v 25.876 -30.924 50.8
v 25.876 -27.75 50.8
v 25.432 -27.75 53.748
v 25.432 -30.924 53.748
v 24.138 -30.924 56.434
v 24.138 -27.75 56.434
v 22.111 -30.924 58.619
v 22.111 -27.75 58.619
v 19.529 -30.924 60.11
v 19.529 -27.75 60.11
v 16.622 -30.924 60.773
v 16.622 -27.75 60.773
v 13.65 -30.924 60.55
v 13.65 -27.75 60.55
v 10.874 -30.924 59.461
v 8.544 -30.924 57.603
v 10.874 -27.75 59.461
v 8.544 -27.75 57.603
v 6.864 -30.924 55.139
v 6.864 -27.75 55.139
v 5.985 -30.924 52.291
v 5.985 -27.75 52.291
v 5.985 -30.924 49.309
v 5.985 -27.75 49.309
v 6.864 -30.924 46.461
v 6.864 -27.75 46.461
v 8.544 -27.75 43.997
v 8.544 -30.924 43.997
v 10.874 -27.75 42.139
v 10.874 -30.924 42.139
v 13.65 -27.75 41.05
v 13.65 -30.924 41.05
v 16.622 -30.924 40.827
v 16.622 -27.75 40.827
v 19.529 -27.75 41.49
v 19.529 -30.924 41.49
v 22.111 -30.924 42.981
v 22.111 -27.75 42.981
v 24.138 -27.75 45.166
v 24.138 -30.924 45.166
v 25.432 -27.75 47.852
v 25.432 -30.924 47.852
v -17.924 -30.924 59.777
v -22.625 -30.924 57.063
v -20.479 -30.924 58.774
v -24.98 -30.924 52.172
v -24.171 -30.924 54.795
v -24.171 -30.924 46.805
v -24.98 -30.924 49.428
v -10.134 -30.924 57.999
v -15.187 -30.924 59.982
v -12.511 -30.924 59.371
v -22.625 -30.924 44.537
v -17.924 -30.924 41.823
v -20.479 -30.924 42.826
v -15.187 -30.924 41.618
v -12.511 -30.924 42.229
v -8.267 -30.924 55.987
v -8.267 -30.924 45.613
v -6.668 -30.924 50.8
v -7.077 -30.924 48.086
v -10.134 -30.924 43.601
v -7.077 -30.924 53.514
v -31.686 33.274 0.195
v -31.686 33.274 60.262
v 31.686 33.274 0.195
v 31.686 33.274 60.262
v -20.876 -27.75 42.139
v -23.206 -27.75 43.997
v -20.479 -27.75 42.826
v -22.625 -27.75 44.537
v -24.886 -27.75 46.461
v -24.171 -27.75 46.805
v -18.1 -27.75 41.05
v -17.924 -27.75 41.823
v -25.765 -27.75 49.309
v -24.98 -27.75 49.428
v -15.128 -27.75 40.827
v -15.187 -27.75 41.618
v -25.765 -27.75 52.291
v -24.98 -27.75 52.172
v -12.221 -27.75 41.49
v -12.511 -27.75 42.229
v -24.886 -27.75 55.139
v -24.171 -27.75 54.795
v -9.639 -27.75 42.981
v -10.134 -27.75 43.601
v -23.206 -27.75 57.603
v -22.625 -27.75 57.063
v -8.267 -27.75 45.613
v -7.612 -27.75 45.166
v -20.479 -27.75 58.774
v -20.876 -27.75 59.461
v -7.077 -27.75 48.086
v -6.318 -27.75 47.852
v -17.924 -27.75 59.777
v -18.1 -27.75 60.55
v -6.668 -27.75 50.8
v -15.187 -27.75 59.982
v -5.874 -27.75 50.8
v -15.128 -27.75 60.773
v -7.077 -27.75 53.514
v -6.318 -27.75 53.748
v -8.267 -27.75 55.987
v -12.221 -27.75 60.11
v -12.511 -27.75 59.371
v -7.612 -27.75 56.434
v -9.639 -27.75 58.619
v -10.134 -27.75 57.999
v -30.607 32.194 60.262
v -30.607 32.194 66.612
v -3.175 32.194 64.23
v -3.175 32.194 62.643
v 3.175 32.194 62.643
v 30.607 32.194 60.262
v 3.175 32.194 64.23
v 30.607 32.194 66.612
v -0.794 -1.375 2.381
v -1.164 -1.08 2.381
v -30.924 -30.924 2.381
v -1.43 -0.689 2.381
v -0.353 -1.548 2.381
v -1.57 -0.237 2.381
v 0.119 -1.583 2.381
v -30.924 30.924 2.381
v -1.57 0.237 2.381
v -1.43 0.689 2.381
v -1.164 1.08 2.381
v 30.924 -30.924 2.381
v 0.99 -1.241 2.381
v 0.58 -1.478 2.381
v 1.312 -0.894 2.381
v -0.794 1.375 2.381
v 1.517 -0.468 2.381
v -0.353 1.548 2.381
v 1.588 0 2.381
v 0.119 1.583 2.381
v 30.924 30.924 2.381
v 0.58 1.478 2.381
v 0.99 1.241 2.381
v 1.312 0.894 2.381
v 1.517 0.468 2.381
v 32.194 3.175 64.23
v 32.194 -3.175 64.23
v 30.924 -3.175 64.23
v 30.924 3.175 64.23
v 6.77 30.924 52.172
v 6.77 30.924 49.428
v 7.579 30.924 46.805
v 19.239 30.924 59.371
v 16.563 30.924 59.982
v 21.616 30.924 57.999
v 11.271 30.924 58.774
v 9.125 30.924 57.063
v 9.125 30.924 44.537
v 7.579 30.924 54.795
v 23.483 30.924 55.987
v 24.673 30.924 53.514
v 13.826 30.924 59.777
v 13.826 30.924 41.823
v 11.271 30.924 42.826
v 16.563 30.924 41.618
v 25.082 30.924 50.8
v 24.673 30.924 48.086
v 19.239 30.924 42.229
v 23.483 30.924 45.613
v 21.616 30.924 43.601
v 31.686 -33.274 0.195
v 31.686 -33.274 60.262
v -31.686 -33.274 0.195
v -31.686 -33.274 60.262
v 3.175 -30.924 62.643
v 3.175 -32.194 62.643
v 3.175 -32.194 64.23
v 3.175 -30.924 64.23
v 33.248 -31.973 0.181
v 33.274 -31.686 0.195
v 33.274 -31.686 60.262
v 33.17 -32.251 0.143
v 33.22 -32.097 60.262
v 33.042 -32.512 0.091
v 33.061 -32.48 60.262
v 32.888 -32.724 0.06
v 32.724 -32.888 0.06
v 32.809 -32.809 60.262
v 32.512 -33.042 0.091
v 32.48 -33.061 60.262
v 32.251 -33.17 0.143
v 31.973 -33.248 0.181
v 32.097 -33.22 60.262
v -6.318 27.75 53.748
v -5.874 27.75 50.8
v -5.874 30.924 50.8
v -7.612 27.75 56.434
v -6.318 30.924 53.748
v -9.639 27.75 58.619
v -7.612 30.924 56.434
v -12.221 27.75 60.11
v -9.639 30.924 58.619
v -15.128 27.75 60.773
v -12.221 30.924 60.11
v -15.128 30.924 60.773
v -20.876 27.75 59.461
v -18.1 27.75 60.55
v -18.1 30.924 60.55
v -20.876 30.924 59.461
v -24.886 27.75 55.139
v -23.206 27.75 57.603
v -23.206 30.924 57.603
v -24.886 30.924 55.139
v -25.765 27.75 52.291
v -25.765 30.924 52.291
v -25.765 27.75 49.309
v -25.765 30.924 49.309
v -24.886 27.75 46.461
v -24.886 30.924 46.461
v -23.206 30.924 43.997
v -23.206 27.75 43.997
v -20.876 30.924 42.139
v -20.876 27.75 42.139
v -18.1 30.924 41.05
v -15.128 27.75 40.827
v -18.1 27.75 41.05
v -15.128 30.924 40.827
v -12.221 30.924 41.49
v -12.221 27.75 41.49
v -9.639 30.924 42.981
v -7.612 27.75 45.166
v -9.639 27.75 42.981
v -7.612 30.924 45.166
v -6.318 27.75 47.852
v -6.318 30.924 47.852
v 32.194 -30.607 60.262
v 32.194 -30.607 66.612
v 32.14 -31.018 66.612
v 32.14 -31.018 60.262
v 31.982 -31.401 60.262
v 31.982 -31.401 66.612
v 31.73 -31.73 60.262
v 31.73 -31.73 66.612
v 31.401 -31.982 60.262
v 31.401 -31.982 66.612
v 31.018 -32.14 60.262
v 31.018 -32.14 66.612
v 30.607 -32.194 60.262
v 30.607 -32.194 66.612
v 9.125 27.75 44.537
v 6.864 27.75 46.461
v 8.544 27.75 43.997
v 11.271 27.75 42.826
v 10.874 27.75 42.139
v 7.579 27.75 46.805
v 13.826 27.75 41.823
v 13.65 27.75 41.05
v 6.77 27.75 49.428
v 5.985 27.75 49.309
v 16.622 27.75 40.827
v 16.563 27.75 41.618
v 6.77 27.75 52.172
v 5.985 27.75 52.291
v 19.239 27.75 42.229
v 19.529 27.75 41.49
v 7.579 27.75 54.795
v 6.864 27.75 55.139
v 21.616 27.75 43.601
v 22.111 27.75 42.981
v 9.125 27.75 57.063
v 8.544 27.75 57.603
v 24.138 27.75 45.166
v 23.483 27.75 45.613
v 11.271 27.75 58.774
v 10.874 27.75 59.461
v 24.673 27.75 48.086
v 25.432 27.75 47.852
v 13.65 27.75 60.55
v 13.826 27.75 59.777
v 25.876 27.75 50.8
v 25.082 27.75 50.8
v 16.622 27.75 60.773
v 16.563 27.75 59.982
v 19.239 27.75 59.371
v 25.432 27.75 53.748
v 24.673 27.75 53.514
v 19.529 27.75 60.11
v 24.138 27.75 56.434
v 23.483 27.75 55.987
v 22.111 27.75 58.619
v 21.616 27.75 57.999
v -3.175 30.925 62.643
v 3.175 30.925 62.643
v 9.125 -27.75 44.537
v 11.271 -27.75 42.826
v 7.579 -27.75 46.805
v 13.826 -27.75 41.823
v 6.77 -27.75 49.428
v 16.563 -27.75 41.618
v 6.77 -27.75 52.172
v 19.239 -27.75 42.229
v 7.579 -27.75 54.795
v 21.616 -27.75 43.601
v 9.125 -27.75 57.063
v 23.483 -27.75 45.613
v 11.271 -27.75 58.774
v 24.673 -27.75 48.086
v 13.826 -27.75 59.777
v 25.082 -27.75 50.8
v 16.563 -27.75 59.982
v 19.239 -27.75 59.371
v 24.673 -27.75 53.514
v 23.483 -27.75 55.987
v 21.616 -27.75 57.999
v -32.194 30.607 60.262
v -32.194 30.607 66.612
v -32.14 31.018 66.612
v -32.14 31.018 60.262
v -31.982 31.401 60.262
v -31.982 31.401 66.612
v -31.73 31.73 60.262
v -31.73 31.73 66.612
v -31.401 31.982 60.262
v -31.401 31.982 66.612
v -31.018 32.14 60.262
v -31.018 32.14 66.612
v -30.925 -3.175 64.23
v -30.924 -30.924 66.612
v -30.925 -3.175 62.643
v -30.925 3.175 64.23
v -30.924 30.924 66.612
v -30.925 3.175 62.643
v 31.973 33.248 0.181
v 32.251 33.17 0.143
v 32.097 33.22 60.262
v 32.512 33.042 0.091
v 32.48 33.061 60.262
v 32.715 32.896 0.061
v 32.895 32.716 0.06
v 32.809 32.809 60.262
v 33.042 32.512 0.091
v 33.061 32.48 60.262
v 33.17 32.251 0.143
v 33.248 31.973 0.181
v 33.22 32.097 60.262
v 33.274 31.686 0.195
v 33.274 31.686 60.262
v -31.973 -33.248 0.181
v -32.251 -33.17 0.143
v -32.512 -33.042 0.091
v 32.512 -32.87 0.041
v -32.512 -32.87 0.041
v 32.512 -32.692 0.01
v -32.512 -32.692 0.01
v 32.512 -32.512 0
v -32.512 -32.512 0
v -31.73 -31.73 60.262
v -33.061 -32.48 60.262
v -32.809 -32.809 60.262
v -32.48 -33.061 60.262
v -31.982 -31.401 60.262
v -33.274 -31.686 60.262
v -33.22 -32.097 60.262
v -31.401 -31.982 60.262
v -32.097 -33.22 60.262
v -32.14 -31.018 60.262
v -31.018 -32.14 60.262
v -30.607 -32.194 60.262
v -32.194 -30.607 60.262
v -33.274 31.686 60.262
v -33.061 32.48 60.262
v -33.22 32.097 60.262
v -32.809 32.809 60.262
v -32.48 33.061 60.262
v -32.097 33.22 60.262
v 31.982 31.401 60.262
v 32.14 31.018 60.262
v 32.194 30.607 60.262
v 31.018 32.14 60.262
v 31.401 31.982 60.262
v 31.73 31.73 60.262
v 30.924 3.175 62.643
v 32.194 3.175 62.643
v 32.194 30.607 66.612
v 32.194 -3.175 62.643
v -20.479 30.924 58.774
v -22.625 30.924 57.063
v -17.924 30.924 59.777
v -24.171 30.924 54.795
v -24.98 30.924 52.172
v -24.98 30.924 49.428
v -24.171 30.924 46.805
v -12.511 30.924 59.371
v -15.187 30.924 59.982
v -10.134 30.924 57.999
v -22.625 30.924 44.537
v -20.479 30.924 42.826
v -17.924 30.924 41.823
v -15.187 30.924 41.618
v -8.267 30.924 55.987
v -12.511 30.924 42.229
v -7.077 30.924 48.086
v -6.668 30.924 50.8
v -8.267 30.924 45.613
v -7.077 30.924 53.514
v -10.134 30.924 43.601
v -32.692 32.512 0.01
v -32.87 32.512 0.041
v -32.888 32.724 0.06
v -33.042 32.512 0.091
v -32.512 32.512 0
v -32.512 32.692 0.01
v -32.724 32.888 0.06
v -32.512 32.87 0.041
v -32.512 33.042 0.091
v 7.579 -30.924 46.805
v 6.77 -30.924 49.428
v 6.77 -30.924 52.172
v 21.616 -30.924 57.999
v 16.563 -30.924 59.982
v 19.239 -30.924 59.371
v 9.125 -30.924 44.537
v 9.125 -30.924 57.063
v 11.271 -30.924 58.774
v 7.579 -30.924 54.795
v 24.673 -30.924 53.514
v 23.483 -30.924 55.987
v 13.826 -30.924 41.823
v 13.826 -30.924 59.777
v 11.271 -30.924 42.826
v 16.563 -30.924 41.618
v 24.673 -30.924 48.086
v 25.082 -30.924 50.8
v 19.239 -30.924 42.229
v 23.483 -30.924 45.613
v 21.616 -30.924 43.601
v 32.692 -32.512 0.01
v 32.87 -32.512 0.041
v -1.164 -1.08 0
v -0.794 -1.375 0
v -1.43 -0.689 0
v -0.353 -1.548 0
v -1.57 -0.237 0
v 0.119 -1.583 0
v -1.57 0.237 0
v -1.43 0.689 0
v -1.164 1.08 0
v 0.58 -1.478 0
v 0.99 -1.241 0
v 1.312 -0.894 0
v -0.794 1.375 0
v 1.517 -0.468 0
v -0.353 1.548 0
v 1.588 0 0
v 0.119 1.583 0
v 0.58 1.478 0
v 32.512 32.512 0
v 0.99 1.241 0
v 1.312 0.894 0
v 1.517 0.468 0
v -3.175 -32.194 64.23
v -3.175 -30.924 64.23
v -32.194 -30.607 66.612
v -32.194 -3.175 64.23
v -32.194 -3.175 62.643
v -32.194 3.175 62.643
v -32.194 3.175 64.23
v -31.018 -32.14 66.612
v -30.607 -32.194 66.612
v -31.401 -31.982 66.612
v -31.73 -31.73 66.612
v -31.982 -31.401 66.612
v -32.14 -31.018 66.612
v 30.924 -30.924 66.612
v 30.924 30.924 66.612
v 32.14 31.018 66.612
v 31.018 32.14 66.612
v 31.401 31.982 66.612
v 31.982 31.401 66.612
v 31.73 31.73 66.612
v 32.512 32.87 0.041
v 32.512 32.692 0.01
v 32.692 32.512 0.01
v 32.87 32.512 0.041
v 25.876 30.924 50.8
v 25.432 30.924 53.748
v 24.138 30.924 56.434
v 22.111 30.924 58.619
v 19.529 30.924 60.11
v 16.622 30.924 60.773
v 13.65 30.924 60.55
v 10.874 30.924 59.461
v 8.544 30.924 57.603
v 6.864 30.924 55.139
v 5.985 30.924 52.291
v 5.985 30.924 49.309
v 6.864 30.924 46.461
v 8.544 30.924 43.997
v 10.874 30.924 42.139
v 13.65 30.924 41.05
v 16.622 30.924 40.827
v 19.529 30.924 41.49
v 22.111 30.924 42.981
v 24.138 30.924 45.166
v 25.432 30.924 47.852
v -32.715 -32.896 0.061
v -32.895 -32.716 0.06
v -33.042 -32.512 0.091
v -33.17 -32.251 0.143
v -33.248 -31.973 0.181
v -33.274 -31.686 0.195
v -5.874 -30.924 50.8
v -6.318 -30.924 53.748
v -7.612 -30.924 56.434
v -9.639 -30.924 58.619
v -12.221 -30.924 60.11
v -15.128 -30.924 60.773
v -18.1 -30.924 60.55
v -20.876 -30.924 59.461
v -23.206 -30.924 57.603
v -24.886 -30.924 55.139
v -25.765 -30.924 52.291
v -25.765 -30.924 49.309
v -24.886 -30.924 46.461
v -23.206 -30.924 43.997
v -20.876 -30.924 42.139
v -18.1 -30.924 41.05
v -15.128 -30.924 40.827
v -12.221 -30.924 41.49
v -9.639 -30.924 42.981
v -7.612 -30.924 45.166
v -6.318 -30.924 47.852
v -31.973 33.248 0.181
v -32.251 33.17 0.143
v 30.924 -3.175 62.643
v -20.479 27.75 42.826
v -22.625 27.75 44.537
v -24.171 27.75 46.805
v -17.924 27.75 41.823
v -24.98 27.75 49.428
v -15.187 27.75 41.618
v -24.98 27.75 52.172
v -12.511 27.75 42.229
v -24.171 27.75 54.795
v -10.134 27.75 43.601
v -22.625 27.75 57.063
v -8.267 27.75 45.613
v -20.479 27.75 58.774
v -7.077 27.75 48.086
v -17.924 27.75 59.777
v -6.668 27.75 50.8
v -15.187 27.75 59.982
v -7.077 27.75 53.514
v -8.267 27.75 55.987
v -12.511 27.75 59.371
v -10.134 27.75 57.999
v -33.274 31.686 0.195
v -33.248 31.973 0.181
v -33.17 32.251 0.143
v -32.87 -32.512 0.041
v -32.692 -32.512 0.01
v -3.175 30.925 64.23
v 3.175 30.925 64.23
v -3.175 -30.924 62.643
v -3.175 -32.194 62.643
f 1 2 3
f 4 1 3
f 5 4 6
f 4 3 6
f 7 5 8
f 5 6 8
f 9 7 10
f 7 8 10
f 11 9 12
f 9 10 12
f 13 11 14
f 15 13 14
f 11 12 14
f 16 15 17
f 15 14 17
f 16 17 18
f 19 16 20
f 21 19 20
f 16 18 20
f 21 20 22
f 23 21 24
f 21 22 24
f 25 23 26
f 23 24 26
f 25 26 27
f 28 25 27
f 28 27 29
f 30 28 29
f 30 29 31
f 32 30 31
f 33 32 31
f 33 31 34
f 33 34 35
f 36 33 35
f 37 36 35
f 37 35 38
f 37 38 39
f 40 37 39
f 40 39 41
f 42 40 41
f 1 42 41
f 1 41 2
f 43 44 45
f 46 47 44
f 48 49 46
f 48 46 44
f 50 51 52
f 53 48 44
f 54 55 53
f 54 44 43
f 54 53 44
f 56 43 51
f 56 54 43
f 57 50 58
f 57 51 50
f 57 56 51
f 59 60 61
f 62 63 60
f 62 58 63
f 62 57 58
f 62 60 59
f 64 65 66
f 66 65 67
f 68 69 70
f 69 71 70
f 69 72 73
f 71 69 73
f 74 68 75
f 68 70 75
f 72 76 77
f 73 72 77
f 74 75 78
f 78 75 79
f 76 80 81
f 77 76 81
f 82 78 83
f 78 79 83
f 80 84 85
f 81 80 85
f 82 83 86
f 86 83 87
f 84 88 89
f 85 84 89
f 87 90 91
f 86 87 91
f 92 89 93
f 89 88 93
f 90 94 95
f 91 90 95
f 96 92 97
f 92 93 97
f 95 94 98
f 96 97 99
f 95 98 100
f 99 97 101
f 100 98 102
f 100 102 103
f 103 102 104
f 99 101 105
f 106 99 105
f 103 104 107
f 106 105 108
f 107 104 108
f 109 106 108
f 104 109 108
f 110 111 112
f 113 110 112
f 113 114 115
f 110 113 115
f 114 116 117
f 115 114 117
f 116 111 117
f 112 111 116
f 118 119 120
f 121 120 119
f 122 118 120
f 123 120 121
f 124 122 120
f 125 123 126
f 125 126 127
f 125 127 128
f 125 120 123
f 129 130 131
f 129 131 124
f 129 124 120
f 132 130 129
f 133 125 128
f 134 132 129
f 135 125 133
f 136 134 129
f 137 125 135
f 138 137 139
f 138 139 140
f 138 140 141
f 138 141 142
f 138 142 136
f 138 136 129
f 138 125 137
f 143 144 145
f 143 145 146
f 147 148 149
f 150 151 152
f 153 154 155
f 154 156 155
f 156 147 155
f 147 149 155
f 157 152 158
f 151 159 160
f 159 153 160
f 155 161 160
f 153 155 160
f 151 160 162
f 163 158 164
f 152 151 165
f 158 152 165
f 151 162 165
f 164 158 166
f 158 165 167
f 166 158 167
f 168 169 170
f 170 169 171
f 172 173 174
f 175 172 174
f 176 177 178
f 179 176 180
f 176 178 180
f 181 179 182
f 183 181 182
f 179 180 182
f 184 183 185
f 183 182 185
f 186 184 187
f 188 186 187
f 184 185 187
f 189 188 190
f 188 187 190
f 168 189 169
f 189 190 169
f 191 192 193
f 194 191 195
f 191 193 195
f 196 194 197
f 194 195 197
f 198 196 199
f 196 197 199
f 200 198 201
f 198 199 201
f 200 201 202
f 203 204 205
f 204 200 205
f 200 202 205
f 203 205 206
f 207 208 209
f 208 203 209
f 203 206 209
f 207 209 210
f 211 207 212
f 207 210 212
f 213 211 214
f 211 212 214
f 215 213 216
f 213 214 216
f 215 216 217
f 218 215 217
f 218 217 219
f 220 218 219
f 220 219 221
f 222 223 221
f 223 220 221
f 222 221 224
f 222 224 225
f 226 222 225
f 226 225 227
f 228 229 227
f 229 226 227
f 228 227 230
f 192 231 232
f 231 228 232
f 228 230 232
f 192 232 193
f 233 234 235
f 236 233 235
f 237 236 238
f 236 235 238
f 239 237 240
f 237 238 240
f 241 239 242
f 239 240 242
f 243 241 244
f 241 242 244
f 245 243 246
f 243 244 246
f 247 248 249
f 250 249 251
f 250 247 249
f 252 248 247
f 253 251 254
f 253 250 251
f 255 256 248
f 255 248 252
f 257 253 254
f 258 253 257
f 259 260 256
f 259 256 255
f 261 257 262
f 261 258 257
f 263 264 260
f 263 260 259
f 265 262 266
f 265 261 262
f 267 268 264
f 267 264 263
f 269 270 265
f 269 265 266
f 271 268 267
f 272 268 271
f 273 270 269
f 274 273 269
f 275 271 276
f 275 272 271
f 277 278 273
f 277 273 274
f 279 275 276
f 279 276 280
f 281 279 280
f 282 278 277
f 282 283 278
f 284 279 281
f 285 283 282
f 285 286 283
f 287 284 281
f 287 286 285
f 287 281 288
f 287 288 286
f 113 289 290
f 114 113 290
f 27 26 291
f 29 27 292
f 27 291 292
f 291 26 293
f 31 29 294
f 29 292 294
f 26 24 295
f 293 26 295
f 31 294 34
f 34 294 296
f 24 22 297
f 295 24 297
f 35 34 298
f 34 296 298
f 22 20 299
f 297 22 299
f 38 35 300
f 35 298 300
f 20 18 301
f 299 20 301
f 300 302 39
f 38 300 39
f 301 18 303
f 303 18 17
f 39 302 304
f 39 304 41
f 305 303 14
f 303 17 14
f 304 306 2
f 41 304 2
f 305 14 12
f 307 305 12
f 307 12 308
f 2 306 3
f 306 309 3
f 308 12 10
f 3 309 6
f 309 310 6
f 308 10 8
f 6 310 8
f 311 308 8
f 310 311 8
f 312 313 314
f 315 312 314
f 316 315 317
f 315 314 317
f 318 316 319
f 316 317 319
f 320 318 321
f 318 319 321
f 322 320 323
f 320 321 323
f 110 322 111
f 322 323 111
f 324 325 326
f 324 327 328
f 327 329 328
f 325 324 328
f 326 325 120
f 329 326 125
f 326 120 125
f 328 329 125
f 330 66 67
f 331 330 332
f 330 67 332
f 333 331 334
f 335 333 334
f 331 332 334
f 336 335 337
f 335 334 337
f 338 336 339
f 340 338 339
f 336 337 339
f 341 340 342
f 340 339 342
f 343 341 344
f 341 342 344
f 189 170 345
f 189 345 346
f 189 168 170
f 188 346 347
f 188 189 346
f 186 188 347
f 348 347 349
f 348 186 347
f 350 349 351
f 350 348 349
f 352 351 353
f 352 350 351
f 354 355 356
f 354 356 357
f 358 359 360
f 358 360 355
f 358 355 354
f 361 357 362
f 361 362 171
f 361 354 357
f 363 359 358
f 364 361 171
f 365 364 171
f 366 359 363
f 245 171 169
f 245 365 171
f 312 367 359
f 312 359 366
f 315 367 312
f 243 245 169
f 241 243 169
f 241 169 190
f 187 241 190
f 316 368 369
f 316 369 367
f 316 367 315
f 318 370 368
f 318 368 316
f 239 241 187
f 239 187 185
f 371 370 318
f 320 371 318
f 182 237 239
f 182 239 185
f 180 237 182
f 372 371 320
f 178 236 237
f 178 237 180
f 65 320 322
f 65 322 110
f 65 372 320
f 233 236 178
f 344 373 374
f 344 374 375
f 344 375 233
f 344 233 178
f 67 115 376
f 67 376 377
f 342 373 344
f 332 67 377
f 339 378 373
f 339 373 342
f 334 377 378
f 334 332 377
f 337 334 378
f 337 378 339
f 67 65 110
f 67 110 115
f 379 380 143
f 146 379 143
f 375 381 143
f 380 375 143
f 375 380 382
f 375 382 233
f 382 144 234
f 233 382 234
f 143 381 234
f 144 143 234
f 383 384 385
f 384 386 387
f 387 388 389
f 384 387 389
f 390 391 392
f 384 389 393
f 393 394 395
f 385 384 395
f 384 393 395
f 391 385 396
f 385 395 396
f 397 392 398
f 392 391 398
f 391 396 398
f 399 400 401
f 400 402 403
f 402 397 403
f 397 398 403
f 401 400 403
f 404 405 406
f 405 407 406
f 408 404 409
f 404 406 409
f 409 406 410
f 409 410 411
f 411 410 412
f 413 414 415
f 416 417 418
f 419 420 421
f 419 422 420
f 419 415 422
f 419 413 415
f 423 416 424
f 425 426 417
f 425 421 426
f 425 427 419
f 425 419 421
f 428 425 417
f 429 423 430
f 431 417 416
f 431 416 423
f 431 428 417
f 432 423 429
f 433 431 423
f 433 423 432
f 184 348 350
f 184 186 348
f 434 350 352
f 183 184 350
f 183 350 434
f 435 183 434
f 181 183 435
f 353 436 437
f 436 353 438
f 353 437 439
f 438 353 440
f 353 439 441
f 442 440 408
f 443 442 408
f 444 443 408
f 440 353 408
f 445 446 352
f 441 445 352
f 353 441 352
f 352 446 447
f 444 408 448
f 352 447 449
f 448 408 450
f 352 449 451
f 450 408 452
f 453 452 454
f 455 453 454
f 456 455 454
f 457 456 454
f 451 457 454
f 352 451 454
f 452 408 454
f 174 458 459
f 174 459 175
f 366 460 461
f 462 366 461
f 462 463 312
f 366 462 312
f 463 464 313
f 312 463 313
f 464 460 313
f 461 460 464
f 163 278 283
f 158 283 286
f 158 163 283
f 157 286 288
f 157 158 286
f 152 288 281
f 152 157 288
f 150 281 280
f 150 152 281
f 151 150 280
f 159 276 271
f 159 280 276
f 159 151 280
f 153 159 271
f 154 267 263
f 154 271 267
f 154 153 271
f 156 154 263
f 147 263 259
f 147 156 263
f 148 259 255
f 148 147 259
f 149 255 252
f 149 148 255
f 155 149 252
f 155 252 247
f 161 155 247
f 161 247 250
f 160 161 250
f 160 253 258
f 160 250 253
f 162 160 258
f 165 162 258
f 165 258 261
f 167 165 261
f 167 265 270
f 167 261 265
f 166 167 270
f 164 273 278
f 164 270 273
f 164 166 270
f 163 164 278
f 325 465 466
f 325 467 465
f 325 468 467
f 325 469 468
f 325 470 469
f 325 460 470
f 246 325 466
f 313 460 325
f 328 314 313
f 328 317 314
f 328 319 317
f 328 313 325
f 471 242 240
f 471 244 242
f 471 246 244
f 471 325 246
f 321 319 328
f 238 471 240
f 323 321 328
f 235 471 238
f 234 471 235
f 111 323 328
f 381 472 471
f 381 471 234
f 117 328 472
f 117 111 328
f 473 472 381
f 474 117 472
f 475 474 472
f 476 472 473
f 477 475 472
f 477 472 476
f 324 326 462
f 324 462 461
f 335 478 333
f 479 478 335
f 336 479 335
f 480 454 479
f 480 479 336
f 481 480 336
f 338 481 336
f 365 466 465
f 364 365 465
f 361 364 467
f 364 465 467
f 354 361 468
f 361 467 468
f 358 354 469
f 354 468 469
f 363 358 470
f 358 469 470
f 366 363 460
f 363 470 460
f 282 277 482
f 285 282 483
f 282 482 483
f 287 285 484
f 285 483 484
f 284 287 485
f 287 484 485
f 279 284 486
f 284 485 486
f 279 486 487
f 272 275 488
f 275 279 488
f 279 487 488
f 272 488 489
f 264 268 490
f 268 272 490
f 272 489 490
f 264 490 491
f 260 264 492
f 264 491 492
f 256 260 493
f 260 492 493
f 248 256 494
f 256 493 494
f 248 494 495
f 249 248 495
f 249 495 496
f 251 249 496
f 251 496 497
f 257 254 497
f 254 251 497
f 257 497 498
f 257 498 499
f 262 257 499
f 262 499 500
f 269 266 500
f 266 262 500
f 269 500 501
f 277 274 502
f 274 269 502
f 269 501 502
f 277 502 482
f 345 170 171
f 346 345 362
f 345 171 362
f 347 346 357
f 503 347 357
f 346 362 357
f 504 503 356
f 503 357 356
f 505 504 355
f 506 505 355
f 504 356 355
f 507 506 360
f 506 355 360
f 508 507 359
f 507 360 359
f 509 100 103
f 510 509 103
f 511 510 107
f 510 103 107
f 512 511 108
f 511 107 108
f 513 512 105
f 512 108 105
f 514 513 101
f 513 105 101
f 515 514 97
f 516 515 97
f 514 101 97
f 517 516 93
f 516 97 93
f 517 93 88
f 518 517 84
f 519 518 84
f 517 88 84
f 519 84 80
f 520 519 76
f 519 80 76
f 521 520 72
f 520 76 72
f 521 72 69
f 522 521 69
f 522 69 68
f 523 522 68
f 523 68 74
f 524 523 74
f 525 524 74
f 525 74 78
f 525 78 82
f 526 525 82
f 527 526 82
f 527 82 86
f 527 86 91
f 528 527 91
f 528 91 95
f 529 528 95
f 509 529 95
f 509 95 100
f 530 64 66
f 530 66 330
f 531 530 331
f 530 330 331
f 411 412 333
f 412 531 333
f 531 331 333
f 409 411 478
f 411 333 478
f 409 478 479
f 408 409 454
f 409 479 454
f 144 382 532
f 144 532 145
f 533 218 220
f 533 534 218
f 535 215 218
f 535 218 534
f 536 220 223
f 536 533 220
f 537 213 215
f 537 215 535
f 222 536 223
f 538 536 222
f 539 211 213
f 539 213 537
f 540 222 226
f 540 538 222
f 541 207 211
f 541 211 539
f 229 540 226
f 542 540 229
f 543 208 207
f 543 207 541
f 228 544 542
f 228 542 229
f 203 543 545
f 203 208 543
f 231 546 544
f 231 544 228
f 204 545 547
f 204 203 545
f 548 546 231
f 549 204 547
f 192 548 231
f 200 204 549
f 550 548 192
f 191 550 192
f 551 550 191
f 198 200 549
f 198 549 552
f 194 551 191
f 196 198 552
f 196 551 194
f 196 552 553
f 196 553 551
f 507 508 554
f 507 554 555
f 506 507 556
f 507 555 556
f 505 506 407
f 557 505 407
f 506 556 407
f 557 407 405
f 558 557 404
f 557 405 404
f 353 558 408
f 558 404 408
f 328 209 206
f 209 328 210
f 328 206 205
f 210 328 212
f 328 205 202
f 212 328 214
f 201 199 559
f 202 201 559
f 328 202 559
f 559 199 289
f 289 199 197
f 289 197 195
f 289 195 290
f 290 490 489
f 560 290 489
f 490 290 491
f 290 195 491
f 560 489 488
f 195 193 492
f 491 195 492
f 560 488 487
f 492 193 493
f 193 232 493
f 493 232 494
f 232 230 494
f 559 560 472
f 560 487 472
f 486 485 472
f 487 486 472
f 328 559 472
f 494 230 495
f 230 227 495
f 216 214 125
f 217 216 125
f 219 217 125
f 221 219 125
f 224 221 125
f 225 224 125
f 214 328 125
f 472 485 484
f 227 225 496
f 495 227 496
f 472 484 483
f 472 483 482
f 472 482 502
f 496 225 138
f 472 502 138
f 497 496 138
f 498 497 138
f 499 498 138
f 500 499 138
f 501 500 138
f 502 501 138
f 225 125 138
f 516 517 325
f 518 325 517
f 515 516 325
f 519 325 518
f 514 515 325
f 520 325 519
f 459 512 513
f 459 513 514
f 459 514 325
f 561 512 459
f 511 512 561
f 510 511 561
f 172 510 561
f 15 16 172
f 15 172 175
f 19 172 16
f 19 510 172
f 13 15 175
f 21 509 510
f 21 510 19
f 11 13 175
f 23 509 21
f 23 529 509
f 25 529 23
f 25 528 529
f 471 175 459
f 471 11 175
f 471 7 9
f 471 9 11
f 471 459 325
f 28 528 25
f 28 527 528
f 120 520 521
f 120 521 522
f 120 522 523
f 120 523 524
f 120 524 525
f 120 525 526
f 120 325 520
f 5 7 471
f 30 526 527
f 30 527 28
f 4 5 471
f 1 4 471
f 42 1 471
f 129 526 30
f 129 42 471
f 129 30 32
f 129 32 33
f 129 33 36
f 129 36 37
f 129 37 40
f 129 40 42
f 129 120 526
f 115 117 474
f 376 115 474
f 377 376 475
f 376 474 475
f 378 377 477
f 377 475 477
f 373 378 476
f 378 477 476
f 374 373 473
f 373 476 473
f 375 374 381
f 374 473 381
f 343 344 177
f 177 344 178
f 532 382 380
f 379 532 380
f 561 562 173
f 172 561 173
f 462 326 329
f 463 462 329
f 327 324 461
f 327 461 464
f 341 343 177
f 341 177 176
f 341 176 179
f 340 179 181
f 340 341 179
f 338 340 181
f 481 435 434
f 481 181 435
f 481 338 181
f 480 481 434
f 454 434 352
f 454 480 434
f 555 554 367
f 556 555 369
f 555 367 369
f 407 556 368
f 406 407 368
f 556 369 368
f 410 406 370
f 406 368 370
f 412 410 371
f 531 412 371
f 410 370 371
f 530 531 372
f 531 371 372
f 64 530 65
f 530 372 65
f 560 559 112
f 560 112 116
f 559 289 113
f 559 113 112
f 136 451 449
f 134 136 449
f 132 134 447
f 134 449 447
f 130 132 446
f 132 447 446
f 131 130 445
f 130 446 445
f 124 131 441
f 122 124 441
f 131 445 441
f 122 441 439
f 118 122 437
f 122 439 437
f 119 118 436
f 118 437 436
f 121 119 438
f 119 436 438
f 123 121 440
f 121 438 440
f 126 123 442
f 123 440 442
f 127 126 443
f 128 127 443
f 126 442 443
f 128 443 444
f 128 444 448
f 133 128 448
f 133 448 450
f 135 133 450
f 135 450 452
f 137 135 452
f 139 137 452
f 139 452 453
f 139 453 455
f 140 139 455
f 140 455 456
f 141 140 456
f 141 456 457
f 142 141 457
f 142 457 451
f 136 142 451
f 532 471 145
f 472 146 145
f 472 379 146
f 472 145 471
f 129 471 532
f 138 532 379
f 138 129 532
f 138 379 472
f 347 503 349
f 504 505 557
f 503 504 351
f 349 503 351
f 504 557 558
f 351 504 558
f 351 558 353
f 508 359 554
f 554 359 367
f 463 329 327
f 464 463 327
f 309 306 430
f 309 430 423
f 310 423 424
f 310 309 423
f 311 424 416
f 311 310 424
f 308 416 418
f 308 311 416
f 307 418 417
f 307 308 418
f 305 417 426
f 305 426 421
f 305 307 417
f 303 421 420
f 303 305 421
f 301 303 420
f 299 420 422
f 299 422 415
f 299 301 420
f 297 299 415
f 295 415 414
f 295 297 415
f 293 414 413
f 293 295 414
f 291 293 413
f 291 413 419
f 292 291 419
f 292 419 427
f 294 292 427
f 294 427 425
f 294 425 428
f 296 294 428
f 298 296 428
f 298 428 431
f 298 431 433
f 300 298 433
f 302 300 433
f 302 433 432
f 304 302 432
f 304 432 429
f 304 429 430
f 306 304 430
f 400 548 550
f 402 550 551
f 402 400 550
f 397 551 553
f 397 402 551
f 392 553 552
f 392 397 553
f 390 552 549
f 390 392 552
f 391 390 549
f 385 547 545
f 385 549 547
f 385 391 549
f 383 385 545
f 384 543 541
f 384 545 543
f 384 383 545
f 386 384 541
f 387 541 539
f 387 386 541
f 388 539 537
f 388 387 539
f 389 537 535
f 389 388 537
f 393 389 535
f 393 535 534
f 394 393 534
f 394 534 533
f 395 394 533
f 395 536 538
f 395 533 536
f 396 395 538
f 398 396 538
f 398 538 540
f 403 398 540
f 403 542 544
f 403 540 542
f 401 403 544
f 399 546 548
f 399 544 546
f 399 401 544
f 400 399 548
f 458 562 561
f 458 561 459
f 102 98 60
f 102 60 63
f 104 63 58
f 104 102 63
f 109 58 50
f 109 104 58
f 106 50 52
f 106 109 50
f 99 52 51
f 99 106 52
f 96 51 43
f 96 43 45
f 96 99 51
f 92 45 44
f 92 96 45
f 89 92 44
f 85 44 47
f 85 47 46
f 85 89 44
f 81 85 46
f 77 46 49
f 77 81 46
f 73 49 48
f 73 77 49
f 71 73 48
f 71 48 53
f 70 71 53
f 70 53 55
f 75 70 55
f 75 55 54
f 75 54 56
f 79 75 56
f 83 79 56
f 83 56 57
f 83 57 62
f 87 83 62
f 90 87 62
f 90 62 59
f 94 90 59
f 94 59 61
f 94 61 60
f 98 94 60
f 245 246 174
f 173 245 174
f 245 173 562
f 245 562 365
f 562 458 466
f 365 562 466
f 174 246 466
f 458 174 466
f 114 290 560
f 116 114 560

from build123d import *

# Parameters (mm, degrees)
F0_W      = 68.199
F0_H      = 68.199
F1_DEPTH  = 66.6115
F2_R      = 1.5875
F3_T      = -3.175
F4_W      = 3.175
F4_H      = 3.175
F4_W_2    = 6.35
F4_H_2    = 6.35
F5_DEPTH  = 25.4
F6_R      = 1.5875
F7_DEPTH  = 6.35
F8_W      = 74.20966
F8_H      = 75.78341
F9_DEPTH  = 6.35
F10_W     = 6.35
F10_H     = 1.5875
F11_DEPTH = 66.295
F12_W     = 6.35
F12_H     = 1.5875
F13_DEPTH = 66.295
F14_R     = 10.00125
F14_R_2   = 9.2075
F15_DEPTH = 61.849
F16_W     = 55.499
F16_H     = 55.499
F17_DEPTH = 38.1
F18_W     = 61.849
F18_H     = 61.849
F19_DEPTH = 0.79375
F20_W     = 68.199
F20_H     = 68.199
F21_DEPTH = 66.6125


with BuildPart() as f1:
    # F0 (on Top) → F1 (new body)
    with BuildSketch(Plane.XY):
        Rectangle(F0_W, F0_H)
    extrude(amount=F1_DEPTH)

    # F2
    f2_edges = [f1.edges().sort_by_distance(p)[0] for p in [
        (-34.0995, 34.0995, 33.30575),
        (-34.0995, 0, 0),
        (-34.0995, -34.0995, 33.30575),
        (34.0995, -34.0995, 33.30575),
        (0, -34.0995, 0),
        (34.0995, 0, 0),
        (0, 34.0995, 0),
        (34.0995, 34.0995, 33.30575),
    ]]
    fillet(f2_edges, radius=F2_R)

    # F3
    f3_openings = [f1.faces().sort_by_distance(p)[0] for p in [
        (0, 0, 66.6115),
    ]]
    offset(amount=F3_T, openings=f3_openings)

    # F4 (on face) → F5 (cut)
    with BuildSketch(Plane.XY.offset(3.175)):
        with Locations((-29.337, 29.337)):
            Rectangle(F4_W, F4_H)
        with Locations((29.337, 29.337)):
            Rectangle(F4_W, F4_H)
        with Locations((-29.337, -29.337)):
            Rectangle(F4_W, F4_H)
        with Locations((29.337, -29.337)):
            Rectangle(F4_W, F4_H)
        with Locations((0, 29.337)):
            Rectangle(F4_W_2, F4_H)
        with Locations((-29.337, 0)):
            Rectangle(F4_W, F4_H_2)
        with Locations((29.337, 0)):
            Rectangle(F4_W, F4_H_2)
        with Locations((0, -29.337)):
            Rectangle(F4_W_2, F4_H)
    extrude(amount=F5_DEPTH, mode=Mode.SUBTRACT)

    # F6 (on face) → F7 (cut)
    with BuildSketch(Plane(origin=(0, 0, 0), x_dir=(1, 0, 0), z_dir=(0, 0, -1))):
        Circle(F6_R)
    extrude(amount=-F7_DEPTH, mode=Mode.SUBTRACT)

    # F8 (on face) → F9 (cut)
    with BuildSketch(Plane.XY.offset(66.6115)):
        Rectangle(F8_W, F8_H)
        with BuildLine():
            Line((-30.607, 32.1945), (30.607, 32.1945))
            ThreePointArc((30.607, 32.1945), (31.729532, 31.729532), (32.1945, 30.607))
            Line((32.1945, 30.607), (32.1945, -30.607))
            ThreePointArc((32.1945, -30.607), (31.729532, -31.729532), (30.607, -32.1945))
            Line((30.607, -32.1945), (-30.607, -32.1945))
            ThreePointArc((-30.607, -32.1945), (-31.729532, -31.729532), (-32.1945, -30.607))
            Line((-32.1945, -30.607), (-32.1945, 30.607))
            ThreePointArc((-32.1945, 30.607), (-31.729532, 31.729532), (-30.607, 32.1945))
        make_face(mode=Mode.SUBTRACT)
    extrude(amount=-F9_DEPTH, mode=Mode.SUBTRACT)

    # F10 (on face) → F11 (cut, through all)
    with BuildSketch(Plane.XZ.offset(32.1945)):
        with Locations((0, 63.4365)):
            Rectangle(F10_W, F10_H)
    extrude(amount=-F11_DEPTH, mode=Mode.SUBTRACT)

    # F12 (on face) → F13 (cut, through all)
    with BuildSketch(Plane.YZ.offset(32.1945)):
        with Locations((0, 63.4365)):
            Rectangle(F12_W, F12_H)
    extrude(amount=-F13_DEPTH, mode=Mode.SUBTRACT)

    # F14 (on face) → F15 (join, through all)
    with BuildSketch(Plane.XZ.offset(-30.9245)):
        with Locations((-15.875, 50.8)):
            Circle(F14_R)
        with Locations((-15.875, 50.8)):
            Circle(F14_R_2, mode=Mode.SUBTRACT)
        with Locations((15.875, 50.8)):
            Circle(F14_R)
        with Locations((15.875, 50.8)):
            Circle(F14_R_2, mode=Mode.SUBTRACT)
    extrude(amount=F15_DEPTH)

    # F16 (on face) → F17 (cut)
    with BuildSketch(Plane.XY.offset(66.6115)):
        Rectangle(F16_W, F16_H)
    extrude(amount=-F17_DEPTH, mode=Mode.SUBTRACT)

    # F18 (on face) → F19 (cut)
    with BuildSketch(Plane.XY.offset(3.175)):
        Rectangle(F18_W, F18_H)
    extrude(amount=-F19_DEPTH, mode=Mode.SUBTRACT)

    # F20 (on face) → F21 (cut, through all)
    with BuildSketch(Plane.XY.offset(66.6115)):
        Rectangle(F20_W, F20_H)
        with BuildLine():
            Line((-31.6865, 33.274), (31.6865, 33.274))
            ThreePointArc((31.6865, 33.274), (32.809032, 32.809032), (33.274, 31.6865))
            Line((33.274, 31.6865), (33.274, -31.6865))
            ThreePointArc((33.274, -31.6865), (32.809032, -32.809032), (31.6865, -33.274))
            Line((31.6865, -33.274), (-31.6865, -33.274))
            ThreePointArc((-31.6865, -33.274), (-32.809032, -32.809032), (-33.274, -31.6865))
            Line((-33.274, -31.6865), (-33.274, 31.6865))
            ThreePointArc((-33.274, 31.6865), (-32.809032, 32.809032), (-31.6865, 33.274))
        make_face(mode=Mode.SUBTRACT)
    extrude(amount=-F21_DEPTH, mode=Mode.SUBTRACT)


solid = f1.part
